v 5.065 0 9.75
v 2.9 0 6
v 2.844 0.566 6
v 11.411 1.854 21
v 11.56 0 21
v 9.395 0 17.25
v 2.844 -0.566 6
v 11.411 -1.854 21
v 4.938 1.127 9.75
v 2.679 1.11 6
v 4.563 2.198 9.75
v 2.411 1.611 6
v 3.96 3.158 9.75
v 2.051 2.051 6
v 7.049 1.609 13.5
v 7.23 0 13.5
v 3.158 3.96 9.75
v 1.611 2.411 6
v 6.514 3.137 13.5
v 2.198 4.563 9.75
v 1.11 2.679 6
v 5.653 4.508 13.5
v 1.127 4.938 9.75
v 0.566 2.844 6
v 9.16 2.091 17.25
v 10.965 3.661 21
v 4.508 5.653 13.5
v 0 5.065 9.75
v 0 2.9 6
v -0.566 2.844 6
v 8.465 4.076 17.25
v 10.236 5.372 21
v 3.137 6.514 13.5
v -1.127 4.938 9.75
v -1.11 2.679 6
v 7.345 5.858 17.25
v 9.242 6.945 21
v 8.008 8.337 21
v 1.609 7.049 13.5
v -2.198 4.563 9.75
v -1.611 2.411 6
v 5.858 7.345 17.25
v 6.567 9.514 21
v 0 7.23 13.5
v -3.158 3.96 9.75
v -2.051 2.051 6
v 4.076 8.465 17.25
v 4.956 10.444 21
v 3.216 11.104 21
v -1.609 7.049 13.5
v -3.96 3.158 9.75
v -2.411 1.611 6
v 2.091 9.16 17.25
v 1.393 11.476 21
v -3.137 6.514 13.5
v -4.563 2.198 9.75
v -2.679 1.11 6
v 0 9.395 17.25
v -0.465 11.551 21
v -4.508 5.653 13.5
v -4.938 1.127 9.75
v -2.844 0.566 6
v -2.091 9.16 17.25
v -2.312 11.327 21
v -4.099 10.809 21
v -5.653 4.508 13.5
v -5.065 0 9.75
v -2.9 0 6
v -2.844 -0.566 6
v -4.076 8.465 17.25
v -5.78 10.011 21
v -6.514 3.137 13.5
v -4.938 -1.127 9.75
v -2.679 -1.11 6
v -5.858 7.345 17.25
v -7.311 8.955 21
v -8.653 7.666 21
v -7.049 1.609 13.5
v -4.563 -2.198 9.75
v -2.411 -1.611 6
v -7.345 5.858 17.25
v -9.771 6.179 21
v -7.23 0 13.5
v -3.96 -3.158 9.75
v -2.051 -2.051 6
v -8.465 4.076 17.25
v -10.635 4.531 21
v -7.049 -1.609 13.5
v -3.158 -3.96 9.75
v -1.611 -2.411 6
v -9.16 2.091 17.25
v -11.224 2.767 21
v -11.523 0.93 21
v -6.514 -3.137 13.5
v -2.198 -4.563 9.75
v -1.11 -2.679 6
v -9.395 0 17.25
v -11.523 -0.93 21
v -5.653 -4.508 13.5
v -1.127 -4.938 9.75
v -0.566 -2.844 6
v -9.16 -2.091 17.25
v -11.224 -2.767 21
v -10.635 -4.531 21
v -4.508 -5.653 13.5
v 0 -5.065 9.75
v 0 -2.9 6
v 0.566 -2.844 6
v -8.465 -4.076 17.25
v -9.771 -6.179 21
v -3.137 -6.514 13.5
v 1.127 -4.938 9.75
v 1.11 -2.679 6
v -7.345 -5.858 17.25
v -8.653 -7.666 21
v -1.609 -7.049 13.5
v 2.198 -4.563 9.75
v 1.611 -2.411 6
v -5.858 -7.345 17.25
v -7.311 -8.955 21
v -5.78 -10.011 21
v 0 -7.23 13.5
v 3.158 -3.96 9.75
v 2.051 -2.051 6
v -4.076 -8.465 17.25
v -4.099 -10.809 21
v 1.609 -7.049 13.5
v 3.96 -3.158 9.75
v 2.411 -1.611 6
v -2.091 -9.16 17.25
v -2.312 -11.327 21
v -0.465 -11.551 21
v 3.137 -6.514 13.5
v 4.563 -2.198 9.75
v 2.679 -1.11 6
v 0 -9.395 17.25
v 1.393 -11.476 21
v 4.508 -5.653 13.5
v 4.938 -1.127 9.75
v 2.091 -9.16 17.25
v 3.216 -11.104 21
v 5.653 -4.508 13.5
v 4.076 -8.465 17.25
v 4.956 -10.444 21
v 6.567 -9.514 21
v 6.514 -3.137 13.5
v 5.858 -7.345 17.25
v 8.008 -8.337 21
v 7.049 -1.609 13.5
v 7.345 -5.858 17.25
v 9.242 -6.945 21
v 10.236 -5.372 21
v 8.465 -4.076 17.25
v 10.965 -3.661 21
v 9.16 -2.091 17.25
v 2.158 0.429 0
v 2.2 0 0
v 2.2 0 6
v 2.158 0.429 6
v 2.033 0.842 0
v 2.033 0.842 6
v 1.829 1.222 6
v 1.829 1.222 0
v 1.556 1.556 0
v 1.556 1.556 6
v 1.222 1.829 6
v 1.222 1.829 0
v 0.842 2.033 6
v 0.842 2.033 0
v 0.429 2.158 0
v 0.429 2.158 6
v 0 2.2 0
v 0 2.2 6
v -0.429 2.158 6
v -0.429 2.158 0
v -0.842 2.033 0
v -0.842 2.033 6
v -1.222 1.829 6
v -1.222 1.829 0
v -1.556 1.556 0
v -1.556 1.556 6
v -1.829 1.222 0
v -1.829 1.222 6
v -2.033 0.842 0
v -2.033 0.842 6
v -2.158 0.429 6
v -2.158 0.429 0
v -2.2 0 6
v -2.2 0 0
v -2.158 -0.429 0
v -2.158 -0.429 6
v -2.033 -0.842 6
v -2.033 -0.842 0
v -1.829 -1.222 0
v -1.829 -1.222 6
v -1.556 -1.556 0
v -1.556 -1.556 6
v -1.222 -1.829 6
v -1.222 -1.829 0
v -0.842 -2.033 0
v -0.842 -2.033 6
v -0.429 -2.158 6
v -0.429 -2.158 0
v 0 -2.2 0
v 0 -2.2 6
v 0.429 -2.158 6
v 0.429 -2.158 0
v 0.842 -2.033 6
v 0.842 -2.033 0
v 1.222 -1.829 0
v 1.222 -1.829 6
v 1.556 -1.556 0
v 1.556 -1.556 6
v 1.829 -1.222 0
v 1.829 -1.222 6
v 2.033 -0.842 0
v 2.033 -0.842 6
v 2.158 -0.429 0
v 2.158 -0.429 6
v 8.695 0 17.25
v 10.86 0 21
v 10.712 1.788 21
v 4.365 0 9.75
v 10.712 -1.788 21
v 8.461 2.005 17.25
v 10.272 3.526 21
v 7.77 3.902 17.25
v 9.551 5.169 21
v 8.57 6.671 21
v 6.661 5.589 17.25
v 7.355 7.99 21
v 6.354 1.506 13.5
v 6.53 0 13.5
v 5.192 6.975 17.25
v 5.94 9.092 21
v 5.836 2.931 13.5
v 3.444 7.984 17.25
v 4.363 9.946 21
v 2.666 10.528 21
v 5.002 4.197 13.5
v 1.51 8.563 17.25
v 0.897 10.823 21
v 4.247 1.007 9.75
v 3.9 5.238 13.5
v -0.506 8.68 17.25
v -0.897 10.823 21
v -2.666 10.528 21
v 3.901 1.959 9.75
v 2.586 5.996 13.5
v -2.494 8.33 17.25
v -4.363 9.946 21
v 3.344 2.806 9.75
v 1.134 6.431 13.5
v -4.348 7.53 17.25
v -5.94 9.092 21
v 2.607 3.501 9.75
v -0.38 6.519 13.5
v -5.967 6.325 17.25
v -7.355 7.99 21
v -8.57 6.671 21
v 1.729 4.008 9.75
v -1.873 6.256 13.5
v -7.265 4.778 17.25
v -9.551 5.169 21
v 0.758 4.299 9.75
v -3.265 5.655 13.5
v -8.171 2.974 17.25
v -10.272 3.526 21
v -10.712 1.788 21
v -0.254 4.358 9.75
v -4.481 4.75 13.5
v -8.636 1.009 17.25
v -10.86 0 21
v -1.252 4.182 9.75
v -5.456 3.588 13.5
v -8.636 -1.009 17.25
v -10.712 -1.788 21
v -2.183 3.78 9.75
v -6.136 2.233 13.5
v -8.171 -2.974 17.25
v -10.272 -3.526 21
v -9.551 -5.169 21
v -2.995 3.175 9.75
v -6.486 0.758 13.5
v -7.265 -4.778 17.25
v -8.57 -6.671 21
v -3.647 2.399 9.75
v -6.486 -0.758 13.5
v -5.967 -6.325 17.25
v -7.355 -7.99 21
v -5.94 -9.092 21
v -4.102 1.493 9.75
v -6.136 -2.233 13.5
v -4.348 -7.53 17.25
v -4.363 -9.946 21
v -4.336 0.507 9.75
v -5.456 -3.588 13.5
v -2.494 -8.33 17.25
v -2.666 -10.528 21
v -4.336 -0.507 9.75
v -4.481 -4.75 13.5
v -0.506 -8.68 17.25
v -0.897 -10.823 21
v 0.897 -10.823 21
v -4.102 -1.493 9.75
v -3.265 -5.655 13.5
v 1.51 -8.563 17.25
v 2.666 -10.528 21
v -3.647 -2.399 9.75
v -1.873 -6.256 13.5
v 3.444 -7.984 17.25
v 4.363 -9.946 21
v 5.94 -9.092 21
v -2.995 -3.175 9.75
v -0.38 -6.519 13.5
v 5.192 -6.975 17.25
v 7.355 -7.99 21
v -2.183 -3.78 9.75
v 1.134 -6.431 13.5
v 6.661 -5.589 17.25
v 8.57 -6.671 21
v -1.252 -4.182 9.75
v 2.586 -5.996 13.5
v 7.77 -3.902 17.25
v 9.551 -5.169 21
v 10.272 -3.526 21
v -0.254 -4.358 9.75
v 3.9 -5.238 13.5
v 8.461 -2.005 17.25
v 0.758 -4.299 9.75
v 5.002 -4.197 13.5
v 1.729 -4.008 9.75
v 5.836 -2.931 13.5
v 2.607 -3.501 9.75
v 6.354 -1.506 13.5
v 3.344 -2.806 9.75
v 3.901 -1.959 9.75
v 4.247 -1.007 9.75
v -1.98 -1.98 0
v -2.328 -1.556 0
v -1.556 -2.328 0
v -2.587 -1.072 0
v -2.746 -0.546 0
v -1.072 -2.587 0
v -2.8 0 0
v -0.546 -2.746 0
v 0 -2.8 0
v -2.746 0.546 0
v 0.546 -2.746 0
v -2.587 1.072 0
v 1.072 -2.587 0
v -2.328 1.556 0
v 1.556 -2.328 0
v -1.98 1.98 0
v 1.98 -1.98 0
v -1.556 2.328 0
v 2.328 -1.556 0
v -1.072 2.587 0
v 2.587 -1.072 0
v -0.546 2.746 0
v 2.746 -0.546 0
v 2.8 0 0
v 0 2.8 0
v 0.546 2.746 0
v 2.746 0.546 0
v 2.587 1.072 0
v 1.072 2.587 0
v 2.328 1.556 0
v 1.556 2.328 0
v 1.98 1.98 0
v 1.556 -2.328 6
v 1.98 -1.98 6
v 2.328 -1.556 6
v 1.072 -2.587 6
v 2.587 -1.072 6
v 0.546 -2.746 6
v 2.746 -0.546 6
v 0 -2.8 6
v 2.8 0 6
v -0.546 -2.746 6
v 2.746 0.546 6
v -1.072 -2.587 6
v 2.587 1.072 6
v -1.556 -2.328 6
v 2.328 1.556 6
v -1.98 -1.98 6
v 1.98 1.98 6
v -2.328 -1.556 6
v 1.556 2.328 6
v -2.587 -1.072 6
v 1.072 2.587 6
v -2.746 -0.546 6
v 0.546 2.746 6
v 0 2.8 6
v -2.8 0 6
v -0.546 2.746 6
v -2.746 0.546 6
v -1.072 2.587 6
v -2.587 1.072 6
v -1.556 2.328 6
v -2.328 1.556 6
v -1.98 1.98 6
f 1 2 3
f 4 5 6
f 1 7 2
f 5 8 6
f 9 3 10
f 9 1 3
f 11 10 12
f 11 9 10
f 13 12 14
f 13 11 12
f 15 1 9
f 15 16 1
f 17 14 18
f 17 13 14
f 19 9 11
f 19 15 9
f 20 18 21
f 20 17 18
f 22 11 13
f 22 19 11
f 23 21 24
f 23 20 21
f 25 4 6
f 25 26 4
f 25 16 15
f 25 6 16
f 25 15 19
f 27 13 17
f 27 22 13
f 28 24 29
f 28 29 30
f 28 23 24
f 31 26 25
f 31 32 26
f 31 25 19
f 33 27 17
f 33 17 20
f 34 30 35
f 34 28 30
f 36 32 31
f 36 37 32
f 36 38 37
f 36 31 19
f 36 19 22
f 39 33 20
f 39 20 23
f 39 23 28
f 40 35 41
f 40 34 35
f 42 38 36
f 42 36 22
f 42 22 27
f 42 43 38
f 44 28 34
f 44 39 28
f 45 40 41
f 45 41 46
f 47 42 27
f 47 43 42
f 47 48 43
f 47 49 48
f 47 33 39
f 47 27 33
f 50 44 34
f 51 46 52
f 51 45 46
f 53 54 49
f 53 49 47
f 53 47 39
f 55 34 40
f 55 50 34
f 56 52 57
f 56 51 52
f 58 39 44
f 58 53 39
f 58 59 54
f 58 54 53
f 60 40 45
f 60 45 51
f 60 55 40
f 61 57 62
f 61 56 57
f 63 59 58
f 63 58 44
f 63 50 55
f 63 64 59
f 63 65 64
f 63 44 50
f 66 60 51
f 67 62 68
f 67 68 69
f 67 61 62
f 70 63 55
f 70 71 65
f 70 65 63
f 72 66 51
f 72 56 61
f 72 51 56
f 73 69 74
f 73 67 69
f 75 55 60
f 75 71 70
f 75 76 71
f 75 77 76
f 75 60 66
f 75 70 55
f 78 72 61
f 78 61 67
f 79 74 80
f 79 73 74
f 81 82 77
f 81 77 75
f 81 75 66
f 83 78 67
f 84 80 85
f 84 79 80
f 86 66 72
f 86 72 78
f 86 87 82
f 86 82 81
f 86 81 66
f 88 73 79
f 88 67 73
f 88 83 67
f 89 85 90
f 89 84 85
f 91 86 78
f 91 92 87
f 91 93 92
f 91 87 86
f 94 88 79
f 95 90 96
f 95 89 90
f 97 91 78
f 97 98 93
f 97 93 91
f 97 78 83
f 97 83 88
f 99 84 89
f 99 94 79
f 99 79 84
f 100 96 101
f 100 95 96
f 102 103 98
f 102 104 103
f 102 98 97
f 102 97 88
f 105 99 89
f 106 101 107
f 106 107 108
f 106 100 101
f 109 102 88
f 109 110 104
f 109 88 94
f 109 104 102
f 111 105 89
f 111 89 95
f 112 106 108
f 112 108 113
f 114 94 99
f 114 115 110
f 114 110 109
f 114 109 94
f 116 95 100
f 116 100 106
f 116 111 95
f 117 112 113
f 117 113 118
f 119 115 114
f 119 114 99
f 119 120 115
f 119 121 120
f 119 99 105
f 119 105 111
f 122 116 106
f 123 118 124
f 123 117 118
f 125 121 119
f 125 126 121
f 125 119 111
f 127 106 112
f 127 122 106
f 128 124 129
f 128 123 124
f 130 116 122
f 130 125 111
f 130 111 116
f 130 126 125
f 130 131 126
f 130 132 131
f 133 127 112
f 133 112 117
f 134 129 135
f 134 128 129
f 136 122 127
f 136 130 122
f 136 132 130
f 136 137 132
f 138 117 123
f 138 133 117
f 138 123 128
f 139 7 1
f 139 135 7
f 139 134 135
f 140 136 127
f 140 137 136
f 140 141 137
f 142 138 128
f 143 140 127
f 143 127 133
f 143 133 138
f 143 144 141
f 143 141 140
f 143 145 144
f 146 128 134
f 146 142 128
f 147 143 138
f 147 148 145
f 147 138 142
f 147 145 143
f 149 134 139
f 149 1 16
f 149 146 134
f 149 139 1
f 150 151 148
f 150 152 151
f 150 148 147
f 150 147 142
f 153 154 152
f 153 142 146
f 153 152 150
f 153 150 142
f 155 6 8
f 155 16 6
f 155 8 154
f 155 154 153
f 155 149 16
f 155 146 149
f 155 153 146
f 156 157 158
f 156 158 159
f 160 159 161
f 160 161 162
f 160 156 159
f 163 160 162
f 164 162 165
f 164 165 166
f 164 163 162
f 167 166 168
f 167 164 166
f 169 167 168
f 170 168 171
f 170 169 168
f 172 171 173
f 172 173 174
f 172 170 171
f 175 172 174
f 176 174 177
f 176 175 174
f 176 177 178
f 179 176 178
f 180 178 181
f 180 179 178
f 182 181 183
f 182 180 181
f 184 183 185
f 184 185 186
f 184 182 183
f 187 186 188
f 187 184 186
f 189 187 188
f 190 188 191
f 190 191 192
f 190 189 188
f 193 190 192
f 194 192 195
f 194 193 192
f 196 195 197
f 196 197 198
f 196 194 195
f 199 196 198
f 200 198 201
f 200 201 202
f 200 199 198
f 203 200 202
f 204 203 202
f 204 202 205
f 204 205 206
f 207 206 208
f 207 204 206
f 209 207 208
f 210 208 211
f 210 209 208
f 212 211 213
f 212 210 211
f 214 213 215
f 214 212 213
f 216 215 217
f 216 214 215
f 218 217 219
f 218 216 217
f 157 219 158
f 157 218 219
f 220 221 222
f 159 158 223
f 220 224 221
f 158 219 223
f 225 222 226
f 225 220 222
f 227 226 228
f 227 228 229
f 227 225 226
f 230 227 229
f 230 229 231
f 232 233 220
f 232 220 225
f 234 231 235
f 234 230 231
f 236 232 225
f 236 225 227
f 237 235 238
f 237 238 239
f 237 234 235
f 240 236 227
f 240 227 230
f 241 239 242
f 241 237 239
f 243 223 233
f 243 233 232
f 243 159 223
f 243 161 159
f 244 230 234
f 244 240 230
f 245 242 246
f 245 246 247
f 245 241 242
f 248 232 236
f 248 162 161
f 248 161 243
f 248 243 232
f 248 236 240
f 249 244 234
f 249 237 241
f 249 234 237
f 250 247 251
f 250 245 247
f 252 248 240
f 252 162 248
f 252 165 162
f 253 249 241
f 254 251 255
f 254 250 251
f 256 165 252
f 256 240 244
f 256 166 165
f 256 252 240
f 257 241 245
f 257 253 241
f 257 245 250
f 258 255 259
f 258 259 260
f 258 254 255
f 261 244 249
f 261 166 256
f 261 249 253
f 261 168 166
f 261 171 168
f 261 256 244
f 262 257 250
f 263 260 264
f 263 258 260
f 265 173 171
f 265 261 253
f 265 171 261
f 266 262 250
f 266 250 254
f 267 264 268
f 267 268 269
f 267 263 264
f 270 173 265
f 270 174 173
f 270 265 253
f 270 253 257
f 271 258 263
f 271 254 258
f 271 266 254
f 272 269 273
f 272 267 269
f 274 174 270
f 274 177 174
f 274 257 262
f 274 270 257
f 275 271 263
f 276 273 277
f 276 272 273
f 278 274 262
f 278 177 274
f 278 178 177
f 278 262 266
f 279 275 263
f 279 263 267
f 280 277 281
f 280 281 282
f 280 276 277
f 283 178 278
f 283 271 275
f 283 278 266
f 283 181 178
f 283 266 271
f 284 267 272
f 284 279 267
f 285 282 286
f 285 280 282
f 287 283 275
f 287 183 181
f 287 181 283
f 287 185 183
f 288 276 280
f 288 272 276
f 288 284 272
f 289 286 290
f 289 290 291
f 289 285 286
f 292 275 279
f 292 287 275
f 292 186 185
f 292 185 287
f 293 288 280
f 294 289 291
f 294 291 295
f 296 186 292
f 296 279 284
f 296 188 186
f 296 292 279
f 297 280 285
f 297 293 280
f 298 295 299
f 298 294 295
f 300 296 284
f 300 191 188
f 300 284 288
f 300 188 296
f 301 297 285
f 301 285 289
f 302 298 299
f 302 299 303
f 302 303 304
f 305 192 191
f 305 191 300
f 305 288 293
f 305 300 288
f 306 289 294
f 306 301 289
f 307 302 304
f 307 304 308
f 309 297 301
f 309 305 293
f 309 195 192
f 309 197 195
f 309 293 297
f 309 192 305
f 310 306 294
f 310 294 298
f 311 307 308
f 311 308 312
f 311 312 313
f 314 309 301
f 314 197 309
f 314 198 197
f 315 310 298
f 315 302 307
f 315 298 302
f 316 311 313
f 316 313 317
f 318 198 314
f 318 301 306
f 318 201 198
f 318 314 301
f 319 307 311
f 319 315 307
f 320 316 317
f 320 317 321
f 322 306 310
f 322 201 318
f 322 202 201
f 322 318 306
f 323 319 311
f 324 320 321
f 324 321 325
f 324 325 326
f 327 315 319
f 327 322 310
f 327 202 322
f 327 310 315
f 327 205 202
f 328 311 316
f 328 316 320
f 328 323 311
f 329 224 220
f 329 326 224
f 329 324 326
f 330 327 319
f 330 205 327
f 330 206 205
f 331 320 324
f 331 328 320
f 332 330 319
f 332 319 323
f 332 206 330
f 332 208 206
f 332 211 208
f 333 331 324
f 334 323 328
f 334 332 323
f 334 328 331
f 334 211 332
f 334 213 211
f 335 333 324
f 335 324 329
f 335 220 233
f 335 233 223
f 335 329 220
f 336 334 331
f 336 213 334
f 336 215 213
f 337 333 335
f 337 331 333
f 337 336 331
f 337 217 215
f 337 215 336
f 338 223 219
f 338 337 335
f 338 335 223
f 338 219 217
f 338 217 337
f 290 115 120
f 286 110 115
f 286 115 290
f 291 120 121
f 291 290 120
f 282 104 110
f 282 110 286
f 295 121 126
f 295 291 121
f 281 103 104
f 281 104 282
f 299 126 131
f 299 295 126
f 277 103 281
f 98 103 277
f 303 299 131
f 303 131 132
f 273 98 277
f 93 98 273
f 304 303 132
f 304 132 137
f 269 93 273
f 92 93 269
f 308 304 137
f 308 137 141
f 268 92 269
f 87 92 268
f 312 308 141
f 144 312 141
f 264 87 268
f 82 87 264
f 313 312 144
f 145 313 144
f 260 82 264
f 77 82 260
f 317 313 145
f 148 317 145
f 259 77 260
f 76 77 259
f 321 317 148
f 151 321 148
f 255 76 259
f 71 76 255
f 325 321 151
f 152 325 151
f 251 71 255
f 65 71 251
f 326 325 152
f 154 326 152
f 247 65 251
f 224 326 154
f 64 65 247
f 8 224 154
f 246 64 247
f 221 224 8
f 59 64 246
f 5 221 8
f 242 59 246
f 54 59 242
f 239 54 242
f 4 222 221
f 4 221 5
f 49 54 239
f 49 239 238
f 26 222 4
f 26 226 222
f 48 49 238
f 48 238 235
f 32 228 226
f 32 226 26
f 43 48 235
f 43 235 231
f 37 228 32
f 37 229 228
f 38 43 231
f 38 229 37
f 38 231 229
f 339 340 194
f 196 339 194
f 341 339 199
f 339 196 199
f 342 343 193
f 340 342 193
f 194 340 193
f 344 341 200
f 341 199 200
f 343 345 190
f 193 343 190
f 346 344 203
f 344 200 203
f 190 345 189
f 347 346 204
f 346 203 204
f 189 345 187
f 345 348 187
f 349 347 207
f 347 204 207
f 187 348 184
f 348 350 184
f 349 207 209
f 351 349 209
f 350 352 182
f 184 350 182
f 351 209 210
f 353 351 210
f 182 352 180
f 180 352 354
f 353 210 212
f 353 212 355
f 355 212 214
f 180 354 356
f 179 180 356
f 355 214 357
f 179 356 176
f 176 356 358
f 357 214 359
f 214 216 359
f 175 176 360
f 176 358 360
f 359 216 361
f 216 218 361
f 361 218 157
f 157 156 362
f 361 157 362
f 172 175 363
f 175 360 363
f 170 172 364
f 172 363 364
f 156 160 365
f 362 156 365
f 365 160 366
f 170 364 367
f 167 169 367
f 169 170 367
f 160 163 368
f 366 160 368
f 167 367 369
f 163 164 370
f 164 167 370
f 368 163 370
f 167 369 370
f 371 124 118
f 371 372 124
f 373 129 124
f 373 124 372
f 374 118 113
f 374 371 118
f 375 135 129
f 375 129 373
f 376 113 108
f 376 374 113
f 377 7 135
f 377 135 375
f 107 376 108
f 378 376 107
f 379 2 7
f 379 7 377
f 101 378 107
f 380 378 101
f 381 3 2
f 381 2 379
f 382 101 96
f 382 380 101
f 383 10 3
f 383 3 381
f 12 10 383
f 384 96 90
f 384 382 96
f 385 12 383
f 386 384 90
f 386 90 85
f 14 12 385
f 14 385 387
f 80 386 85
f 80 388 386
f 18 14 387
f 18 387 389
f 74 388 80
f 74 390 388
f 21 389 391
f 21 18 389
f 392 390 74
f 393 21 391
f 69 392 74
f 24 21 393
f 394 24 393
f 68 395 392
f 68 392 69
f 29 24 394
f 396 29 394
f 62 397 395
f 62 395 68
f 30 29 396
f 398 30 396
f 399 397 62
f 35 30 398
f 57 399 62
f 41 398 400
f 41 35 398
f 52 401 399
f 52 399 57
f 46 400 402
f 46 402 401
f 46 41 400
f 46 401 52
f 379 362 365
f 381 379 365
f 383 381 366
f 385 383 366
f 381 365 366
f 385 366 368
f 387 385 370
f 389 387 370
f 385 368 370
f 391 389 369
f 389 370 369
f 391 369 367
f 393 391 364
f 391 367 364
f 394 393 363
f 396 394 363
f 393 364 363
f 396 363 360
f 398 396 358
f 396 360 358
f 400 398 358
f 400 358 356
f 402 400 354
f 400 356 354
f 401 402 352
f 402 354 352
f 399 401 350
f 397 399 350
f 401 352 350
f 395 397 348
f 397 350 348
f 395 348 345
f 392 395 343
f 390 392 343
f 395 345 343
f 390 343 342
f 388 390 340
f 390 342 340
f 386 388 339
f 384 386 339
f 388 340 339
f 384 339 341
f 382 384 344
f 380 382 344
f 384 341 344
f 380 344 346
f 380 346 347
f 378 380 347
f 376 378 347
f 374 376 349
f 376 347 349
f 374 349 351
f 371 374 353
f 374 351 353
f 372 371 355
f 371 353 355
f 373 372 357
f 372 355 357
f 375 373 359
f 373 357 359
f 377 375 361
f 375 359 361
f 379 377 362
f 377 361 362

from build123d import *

# Parameters (mm, degrees)
F0_R     = 2.8
F0_R_2   = 2.2
F1_DEPTH = 6


with BuildPart() as f1:
    # F0 (on Top) → F1 (new body)
    with BuildSketch(Plane.XY):
        Circle(F0_R)
        Circle(F0_R_2, mode=Mode.SUBTRACT)
    extrude(amount=F1_DEPTH)

    # F2 (on Front) → F3 (revolve)
    with BuildSketch(Plane.XZ):
        Polygon((10.860254, 21), (2.2, 6), (2.9, 6), (11.560254, 21), align=None)
    revolve(axis=Axis((0, 0, 15.443827), (0, 0, 1)))


solid = f1.part
